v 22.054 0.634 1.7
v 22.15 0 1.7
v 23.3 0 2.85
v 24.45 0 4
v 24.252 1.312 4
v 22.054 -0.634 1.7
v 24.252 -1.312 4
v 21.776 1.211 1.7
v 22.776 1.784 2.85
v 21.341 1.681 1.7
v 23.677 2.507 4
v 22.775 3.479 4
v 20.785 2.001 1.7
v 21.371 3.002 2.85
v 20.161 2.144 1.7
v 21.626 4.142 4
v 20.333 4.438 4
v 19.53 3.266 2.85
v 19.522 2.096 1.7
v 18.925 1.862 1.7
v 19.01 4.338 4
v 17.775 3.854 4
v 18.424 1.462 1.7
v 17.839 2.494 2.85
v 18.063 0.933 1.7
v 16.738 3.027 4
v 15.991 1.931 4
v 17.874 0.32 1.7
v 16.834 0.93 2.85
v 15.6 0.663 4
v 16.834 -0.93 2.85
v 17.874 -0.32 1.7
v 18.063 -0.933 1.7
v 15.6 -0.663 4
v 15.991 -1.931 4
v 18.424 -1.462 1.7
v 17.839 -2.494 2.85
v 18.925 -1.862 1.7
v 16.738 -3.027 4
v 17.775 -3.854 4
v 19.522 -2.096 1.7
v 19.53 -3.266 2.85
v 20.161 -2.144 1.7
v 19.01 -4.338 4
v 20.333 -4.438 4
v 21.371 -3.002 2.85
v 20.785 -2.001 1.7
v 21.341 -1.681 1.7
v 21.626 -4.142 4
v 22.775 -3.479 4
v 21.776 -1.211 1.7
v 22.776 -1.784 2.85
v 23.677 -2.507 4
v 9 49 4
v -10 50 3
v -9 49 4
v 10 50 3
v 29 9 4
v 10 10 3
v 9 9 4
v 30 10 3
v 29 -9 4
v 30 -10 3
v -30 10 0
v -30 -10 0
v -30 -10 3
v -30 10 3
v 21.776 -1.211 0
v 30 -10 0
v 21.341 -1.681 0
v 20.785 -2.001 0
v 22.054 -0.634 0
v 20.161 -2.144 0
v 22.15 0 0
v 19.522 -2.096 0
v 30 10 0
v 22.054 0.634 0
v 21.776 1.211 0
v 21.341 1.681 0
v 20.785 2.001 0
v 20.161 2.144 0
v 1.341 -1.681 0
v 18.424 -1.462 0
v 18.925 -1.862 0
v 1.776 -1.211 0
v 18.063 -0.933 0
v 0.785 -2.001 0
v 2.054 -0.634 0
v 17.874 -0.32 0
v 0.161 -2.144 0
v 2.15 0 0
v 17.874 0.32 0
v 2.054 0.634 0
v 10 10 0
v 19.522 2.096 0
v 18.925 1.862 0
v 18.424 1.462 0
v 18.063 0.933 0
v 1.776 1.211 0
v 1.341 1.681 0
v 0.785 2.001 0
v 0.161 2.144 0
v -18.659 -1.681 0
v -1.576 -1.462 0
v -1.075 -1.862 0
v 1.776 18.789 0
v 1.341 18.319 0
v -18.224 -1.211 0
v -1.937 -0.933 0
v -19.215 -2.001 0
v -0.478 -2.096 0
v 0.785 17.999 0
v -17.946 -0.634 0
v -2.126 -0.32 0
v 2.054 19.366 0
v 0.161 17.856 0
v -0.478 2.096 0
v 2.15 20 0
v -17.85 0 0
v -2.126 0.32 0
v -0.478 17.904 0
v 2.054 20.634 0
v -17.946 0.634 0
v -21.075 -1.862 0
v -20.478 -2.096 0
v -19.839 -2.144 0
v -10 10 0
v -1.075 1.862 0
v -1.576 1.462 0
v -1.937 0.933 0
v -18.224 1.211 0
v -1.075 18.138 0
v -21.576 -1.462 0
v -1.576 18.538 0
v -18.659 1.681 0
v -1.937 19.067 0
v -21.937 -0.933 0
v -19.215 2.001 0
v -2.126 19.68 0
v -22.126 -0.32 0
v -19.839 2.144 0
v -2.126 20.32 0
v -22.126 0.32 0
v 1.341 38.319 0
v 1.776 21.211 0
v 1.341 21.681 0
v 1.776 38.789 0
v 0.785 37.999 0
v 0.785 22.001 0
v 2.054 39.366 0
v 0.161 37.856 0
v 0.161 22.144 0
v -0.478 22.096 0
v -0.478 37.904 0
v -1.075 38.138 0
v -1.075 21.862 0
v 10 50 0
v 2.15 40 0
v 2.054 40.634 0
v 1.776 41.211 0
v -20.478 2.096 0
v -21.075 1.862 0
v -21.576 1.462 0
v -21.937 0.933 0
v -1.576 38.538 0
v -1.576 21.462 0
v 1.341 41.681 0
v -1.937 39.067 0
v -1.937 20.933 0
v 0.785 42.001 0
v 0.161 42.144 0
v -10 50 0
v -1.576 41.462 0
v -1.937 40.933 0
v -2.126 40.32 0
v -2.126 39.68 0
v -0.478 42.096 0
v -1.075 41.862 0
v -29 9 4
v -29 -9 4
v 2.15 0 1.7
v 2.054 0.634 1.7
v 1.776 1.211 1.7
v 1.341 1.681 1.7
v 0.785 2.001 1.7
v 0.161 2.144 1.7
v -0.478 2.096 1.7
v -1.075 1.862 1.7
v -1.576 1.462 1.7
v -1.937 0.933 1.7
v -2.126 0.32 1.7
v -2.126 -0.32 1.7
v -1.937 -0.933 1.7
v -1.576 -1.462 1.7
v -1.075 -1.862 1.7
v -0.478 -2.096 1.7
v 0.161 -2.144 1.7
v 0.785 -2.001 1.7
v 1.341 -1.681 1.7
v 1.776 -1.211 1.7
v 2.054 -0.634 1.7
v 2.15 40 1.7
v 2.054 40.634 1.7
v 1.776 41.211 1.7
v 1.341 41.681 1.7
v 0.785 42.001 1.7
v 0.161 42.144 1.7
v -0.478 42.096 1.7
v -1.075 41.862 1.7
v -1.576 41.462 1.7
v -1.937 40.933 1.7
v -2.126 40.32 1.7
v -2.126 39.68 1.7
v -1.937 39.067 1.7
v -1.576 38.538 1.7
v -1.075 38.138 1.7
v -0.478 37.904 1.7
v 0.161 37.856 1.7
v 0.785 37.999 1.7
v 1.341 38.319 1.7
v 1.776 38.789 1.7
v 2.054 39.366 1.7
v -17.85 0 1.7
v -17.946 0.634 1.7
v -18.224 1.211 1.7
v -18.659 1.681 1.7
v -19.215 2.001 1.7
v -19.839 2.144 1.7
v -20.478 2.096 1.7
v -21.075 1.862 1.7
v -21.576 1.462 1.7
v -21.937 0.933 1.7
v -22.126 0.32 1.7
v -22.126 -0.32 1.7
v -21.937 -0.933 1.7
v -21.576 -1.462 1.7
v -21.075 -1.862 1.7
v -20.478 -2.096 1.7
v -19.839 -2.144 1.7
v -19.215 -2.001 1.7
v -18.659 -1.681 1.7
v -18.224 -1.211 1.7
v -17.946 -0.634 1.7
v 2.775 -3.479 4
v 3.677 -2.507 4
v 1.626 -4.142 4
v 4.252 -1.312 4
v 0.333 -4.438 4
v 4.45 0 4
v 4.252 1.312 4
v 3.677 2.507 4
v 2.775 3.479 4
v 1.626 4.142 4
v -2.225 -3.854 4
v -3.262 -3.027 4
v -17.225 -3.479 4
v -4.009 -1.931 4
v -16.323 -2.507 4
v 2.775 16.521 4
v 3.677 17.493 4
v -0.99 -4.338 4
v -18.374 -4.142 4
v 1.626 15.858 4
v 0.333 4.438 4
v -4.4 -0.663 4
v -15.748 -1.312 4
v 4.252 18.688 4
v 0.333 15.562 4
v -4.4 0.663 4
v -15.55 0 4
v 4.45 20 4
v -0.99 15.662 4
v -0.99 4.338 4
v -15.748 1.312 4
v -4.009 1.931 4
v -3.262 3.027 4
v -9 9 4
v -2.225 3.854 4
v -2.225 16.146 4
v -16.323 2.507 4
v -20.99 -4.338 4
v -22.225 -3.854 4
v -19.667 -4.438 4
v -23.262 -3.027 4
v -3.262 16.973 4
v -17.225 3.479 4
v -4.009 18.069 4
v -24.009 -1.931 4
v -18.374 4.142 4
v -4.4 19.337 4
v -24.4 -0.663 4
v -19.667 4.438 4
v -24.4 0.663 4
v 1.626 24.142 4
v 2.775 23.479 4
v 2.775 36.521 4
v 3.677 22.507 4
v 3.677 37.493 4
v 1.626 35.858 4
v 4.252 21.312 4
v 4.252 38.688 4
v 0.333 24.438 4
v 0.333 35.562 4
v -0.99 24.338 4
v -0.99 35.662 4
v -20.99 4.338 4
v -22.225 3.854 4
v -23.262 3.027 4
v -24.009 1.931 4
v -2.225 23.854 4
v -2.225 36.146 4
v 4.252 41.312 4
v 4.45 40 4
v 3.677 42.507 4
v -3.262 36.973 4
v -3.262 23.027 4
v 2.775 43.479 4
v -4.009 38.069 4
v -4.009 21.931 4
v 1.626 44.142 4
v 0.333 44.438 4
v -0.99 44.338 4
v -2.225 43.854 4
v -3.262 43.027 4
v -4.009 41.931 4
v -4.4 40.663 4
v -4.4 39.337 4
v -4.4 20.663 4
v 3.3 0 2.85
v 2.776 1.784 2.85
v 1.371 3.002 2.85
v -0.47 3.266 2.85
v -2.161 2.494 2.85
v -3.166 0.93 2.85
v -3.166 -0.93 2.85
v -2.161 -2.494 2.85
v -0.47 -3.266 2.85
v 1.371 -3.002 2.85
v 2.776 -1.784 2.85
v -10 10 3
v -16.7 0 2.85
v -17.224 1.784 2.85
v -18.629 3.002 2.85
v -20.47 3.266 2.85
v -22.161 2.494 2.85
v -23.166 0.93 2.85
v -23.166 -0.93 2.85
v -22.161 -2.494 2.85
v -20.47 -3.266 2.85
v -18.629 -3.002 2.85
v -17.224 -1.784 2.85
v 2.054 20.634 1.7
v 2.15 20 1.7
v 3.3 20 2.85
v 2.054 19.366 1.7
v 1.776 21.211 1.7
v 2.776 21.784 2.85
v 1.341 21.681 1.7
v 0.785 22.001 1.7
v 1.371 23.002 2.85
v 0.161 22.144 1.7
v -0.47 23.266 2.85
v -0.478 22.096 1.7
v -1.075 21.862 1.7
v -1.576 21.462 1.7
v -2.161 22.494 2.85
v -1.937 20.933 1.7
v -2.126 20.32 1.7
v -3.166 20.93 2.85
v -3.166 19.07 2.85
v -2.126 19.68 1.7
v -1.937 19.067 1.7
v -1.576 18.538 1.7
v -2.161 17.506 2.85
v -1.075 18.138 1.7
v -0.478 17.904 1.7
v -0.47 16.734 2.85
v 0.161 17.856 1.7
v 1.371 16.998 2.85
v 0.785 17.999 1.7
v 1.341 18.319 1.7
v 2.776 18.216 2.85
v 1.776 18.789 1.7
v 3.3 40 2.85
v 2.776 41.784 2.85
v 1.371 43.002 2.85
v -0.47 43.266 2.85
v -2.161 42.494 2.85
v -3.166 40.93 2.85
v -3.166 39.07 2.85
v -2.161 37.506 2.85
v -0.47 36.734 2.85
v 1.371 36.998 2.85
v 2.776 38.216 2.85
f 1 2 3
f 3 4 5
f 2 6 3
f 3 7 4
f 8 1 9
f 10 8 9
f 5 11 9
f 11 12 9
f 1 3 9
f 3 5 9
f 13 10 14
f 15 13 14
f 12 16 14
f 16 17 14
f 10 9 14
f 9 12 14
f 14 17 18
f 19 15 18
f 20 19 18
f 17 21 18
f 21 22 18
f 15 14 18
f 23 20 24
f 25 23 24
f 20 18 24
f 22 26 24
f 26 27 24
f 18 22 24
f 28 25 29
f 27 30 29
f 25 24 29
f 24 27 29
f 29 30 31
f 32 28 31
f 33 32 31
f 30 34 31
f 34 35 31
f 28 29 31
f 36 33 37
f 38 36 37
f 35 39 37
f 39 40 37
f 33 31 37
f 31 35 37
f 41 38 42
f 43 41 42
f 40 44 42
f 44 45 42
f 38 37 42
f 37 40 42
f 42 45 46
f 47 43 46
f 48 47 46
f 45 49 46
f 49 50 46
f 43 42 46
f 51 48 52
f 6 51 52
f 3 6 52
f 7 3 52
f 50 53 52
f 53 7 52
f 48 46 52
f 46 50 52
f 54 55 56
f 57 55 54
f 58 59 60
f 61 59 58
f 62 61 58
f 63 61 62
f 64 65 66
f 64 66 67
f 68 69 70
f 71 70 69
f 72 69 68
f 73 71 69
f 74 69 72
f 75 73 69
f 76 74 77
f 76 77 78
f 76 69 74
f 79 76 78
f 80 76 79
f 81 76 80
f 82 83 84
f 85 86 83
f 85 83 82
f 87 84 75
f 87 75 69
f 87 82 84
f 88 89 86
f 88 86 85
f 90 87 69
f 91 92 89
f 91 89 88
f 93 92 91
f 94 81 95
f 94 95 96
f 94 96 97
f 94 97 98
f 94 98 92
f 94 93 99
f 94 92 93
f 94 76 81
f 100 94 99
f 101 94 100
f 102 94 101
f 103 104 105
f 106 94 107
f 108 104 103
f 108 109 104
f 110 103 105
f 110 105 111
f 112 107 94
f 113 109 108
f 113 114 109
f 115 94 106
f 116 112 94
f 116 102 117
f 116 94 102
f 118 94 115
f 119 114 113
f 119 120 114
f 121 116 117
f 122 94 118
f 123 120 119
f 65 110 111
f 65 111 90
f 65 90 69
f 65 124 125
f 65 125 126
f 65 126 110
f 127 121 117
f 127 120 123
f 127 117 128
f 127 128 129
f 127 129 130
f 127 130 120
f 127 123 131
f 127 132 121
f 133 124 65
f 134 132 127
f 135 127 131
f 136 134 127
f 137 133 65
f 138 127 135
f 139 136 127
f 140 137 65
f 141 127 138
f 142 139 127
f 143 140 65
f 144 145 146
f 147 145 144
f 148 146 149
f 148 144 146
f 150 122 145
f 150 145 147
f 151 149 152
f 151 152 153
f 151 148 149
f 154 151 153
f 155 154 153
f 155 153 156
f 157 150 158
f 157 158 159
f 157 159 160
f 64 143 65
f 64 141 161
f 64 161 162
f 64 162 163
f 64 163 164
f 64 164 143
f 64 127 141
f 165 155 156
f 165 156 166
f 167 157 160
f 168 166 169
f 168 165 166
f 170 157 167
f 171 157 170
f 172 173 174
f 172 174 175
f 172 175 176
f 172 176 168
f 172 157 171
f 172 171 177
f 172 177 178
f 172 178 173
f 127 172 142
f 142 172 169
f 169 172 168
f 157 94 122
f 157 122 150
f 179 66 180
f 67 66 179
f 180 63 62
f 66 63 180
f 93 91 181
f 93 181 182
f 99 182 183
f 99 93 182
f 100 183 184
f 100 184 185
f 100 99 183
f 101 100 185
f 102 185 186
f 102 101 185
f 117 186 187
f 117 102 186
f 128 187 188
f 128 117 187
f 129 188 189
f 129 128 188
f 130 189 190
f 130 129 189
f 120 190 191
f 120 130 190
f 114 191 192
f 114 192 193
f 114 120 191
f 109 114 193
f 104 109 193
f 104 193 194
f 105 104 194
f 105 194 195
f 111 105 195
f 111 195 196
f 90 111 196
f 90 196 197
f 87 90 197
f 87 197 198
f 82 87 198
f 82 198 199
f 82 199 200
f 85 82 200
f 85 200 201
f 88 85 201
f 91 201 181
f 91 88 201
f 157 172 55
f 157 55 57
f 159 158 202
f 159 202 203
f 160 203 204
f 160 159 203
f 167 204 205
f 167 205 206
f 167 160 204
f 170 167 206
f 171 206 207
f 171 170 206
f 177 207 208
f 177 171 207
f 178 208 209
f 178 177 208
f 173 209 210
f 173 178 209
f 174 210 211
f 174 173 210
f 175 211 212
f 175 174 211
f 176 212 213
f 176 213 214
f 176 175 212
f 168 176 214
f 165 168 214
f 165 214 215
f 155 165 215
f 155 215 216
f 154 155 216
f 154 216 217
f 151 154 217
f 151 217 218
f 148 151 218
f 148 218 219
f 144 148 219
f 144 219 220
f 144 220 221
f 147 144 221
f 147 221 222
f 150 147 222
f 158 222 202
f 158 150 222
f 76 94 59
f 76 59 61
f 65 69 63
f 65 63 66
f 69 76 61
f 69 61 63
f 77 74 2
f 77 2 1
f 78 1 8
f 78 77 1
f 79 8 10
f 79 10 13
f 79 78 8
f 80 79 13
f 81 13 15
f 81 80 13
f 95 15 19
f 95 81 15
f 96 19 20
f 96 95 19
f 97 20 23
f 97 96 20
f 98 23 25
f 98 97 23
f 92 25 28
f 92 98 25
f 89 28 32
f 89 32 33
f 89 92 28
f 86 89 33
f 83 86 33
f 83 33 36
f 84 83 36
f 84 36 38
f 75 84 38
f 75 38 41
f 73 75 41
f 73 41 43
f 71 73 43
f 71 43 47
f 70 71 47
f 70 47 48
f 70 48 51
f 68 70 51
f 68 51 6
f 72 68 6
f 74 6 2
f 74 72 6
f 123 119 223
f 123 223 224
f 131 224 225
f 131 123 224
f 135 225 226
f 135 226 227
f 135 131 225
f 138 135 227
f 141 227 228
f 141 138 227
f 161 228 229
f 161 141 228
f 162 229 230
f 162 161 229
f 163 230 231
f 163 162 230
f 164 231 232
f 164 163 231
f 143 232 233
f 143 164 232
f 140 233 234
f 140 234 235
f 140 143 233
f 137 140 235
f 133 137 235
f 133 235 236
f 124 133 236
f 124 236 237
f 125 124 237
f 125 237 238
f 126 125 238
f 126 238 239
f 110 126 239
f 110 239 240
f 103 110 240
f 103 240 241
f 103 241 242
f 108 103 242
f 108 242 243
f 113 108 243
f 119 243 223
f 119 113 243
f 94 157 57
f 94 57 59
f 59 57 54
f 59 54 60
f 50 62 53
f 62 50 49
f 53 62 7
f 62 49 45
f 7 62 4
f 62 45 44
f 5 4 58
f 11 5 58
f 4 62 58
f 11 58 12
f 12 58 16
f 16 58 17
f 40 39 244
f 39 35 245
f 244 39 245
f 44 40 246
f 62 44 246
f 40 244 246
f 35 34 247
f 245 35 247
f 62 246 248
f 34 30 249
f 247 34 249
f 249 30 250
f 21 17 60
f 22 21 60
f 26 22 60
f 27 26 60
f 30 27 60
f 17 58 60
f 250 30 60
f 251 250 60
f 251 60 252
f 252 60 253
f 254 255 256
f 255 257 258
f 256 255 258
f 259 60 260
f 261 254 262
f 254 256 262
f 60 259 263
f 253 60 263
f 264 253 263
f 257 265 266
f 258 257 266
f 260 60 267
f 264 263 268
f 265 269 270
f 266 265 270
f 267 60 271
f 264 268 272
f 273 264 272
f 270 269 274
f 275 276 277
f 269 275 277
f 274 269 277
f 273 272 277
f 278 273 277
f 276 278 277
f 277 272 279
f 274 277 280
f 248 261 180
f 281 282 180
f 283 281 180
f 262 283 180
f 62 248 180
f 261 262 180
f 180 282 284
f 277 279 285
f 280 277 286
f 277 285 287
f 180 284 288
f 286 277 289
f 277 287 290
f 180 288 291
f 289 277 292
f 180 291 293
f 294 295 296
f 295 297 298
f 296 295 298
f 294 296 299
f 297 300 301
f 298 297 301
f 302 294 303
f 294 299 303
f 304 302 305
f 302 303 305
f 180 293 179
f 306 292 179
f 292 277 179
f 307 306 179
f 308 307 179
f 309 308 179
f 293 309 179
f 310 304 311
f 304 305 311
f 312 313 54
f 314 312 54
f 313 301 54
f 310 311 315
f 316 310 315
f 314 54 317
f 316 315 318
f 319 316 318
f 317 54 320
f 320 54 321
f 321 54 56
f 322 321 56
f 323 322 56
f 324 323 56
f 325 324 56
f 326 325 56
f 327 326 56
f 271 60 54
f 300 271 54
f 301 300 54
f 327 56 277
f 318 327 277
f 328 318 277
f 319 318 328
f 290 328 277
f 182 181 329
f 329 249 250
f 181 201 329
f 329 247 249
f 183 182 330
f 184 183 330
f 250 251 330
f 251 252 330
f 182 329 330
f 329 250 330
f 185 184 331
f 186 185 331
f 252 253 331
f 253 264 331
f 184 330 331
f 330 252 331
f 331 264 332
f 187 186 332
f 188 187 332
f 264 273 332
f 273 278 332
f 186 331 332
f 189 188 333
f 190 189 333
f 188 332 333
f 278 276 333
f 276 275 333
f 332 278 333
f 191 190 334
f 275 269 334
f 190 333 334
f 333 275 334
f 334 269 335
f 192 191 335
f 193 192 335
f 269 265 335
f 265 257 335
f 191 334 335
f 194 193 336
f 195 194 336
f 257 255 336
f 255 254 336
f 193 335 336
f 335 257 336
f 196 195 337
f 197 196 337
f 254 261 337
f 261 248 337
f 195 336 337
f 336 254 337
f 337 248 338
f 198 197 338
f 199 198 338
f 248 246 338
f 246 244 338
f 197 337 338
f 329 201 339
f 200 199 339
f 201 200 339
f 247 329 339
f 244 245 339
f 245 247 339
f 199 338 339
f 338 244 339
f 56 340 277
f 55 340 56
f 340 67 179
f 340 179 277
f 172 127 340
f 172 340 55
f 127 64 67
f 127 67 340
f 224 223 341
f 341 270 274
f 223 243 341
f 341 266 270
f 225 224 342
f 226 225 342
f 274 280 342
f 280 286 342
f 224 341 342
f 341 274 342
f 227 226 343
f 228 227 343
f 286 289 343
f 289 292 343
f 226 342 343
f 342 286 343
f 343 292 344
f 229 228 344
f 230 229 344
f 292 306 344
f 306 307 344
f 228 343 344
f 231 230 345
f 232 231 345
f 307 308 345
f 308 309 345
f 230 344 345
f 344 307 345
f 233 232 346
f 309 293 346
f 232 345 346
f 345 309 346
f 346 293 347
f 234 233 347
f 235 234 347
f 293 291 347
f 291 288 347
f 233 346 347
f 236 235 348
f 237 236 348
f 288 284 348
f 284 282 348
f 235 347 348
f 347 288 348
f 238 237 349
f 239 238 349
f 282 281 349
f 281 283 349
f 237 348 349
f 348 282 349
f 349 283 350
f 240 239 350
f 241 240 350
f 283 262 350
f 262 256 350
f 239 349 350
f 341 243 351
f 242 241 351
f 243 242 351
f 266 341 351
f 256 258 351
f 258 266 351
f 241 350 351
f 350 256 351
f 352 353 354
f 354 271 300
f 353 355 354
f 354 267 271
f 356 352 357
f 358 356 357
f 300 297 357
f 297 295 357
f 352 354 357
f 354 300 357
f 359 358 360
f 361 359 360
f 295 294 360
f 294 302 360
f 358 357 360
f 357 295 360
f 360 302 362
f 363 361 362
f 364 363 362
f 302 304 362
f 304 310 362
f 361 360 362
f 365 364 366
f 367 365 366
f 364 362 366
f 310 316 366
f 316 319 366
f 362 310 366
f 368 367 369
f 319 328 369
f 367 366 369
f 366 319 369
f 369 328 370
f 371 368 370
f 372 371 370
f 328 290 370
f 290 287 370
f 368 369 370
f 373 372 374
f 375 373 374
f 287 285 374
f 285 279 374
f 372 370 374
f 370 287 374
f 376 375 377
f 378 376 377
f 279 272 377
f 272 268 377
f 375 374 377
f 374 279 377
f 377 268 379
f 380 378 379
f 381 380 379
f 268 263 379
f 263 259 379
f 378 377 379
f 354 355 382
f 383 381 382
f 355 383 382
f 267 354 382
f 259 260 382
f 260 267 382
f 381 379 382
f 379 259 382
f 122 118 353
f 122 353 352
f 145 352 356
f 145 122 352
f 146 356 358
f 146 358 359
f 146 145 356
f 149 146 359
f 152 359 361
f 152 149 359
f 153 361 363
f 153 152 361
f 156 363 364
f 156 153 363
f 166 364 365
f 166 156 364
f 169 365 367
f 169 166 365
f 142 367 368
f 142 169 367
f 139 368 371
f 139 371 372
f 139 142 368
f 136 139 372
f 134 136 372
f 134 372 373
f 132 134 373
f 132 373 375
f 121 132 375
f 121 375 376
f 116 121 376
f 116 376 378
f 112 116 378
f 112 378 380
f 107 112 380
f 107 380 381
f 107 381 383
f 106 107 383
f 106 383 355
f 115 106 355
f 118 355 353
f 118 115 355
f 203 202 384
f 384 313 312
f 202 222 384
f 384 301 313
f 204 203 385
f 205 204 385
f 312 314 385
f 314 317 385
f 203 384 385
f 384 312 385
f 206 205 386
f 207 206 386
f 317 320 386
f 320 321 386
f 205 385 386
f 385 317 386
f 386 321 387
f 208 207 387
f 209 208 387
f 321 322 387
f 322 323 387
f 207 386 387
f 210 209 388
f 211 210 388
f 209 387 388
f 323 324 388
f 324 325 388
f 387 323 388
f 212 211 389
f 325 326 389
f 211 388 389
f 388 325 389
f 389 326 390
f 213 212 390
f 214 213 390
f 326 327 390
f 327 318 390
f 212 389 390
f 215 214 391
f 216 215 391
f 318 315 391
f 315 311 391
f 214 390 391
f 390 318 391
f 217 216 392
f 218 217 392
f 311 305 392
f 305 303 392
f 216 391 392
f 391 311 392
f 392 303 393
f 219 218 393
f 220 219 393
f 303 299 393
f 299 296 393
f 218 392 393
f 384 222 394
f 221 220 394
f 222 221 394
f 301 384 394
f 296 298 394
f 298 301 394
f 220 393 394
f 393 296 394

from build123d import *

# Parameters (mm, degrees)
SKETCH1_R           = 2.15
BOSS_EXTRUDE1_DEPTH = 4
CHAMFER2_SIZE       = 2.3
CHAMFER3_SIZE       = 1


with BuildPart() as part:
    # Sketch1 → Boss-Extrude1 (new body)
    with BuildSketch(Plane.XY):
        Polygon((10, 10), (30, 10), (30, -10), (-30, -10), (-30, 10), (-10, 10), (-10, 50), (10, 50), align=None)
        with Locations((0, 20)):
            Circle(SKETCH1_R, mode=Mode.SUBTRACT)
        with Locations((20, 0)):
            Circle(SKETCH1_R, mode=Mode.SUBTRACT)
        with Locations((-20, 0)):
            Circle(SKETCH1_R, mode=Mode.SUBTRACT)
        with Locations((0, 40)):
            Circle(SKETCH1_R, mode=Mode.SUBTRACT)
        Circle(SKETCH1_R, mode=Mode.SUBTRACT)
    extrude(amount=BOSS_EXTRUDE1_DEPTH)

    # Chamfer2
    chamfer2_edges = [part.edges().sort_by_distance(p)[0] for p in [
        (17.85, 0, 4),
        (-2.15, 20, 4),
        (-22.15, 0, 4),
        (-2.15, 40, 4),
        (-2.15, 0, 4),
    ]]
    chamfer(chamfer2_edges, length=CHAMFER2_SIZE)

    # Chamfer3
    chamfer3_edges = [part.edges().sort_by_distance(p)[0] for p in [
        (10, 30, 4),
        (0, 50, 4),
        (-10, 30, 4),
        (-20, 10, 4),
        (-30, 0, 4),
        (0, -10, 4),
        (30, 0, 4),
        (20, 10, 4),
    ]]
    chamfer(chamfer3_edges, length=CHAMFER3_SIZE)


solid = part.part
